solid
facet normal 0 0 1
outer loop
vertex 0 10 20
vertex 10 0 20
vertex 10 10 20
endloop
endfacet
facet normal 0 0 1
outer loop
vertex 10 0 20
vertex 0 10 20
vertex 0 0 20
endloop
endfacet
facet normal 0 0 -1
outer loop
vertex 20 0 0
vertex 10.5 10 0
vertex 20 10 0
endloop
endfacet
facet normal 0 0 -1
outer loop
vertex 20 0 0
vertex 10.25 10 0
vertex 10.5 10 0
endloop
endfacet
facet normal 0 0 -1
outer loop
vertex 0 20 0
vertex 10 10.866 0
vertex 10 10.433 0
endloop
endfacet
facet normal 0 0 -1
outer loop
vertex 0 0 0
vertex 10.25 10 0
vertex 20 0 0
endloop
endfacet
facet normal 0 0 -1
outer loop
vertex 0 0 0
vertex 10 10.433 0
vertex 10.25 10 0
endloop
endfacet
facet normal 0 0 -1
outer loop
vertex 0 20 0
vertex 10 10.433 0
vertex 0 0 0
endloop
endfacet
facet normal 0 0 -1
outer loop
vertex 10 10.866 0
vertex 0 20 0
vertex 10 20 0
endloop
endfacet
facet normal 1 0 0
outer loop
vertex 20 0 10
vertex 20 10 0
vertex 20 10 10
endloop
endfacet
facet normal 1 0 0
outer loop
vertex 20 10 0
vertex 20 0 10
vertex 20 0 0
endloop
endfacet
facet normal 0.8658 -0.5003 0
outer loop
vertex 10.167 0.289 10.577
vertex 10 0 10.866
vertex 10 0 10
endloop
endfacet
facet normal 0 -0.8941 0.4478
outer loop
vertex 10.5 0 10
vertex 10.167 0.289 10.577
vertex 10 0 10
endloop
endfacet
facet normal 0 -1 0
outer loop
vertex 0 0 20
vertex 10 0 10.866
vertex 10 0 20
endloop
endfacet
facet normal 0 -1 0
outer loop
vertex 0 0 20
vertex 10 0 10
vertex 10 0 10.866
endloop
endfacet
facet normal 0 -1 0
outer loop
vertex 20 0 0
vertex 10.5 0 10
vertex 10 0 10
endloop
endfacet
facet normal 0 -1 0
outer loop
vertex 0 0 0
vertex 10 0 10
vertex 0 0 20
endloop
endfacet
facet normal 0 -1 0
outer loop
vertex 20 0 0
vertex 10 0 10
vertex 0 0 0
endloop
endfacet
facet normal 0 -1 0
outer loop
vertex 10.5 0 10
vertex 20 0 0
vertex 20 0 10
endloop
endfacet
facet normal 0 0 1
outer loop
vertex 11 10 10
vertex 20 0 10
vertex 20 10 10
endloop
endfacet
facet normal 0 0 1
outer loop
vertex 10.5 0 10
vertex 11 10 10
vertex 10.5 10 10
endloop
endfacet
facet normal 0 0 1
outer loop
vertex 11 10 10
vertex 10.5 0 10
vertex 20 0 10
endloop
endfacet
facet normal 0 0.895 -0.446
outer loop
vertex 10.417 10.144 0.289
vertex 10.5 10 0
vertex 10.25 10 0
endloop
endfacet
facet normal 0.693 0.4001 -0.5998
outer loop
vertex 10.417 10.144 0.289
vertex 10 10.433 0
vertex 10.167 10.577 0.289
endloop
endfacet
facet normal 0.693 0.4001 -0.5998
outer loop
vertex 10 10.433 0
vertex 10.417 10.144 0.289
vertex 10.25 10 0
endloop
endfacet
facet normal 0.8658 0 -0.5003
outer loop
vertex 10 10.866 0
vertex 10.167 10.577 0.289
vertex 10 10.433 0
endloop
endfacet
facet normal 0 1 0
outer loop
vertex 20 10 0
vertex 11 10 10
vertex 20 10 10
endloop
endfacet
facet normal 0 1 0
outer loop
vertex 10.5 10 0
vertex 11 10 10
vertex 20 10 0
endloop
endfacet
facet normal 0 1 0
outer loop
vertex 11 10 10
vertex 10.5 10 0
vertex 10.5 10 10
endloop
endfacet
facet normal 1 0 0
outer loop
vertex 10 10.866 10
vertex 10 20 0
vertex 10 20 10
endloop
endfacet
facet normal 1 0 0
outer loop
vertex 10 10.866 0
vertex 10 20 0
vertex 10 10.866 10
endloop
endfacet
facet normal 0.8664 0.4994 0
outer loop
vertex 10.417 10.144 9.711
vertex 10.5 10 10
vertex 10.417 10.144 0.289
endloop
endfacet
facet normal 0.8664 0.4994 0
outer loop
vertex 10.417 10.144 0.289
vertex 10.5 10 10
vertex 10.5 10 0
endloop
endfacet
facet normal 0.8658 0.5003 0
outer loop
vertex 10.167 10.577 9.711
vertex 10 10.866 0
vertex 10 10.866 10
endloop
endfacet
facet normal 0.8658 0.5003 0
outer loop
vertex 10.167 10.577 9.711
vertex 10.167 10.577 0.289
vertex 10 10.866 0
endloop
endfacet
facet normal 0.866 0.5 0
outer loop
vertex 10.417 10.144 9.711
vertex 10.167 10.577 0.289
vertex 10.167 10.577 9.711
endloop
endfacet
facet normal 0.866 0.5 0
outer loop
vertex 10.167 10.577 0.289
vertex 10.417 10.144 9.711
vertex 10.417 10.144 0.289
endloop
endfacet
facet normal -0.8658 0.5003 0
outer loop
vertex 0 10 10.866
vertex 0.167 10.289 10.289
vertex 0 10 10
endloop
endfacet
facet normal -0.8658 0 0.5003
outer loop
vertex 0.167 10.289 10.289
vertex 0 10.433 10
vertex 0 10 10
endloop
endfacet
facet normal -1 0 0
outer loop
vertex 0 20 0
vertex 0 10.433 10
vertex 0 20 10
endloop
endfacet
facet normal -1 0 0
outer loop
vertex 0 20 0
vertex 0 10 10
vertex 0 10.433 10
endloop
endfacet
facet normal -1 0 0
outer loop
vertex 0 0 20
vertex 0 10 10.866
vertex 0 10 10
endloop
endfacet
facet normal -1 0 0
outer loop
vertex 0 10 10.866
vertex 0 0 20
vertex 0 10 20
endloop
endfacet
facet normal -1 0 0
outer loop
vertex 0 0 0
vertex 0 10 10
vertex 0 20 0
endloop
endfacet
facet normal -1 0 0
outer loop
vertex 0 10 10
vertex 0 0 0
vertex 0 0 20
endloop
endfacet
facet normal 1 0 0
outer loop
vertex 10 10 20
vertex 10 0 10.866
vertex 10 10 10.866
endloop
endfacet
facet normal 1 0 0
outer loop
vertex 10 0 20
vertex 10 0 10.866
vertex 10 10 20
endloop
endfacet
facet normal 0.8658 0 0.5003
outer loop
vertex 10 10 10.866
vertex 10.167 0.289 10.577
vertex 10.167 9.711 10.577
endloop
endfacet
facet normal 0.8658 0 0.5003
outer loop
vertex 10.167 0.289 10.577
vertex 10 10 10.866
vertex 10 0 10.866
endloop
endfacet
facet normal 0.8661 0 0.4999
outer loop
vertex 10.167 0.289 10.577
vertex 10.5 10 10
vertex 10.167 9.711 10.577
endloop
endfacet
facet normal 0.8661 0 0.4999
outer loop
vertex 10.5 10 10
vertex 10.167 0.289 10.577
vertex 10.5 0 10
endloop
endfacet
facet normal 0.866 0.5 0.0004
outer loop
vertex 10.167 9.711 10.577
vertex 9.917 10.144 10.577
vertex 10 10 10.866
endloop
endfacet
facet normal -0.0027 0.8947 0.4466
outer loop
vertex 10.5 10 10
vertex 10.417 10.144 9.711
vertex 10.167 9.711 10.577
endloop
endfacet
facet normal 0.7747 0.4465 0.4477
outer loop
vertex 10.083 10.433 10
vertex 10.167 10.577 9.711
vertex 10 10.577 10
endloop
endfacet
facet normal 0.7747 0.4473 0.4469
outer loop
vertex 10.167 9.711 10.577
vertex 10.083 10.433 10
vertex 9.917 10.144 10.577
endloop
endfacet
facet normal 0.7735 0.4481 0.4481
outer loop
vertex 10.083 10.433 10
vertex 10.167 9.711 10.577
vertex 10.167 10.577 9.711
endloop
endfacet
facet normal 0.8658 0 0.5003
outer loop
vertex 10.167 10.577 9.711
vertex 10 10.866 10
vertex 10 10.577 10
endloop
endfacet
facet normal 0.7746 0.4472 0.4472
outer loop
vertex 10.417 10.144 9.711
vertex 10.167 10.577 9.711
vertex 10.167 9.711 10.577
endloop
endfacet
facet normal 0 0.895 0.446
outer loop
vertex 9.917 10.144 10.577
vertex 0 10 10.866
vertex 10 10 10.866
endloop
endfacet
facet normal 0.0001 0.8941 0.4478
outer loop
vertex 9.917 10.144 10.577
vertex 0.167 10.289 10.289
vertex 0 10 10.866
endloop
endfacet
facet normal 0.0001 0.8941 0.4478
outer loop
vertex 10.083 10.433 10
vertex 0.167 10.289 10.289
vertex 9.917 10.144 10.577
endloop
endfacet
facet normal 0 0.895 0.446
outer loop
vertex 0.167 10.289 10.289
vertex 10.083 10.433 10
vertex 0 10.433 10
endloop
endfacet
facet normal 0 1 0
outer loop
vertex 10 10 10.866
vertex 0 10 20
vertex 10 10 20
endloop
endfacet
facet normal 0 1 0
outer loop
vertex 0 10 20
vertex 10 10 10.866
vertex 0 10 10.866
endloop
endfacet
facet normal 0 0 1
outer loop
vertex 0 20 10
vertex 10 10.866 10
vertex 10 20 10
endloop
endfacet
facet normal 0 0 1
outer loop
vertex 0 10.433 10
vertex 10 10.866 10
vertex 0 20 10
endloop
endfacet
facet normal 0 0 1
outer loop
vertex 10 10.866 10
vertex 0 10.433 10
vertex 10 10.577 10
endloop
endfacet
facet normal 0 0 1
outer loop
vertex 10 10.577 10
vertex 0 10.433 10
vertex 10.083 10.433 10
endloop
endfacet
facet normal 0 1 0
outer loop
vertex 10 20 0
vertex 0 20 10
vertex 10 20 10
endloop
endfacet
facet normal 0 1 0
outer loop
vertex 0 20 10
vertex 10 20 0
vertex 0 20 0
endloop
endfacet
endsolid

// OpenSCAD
// by: Scorch
// http://www.scorchworks.com/Blog/openscad-modules-for-automatic-fillets-and-radii/
// www.scorchworks.com
// 12/29/2015

// PARAMETERS

sample_R    = 1;      // Radius of the fillet/round to be added

sample_OB   = 1000;   // Outer boundary (should be larger than model outer boundary)

sample_axis = "xyz";  // ["xyz":"xyz",x:x,y:y,z:z]
                      // axes to round choose one (x,y,z, or xyz)

sample_fn   = 6;      // number of facets on radius (per 360 degrees)

MAKE_EXAMPLE = 1;    // [0:Generate sample base part,1: Add fillets to base part,2: Add rounds to base part,3: Add fillets and rounds to base part,4: Add local fillets to base part,5: Add local rounds to base part,6: Add local fillets and local rounds to base part, 7: Show transparent local area selection box on base part]

//-1: Do not make example part
// 0: Generate sample base part
// 1: Add fillets to base part 
// 2: Add rounds to base part 
// 3: Add fillets and rounds to base part 
// 4: Add local fillets to base part 
// 5: Add local rounds to base part 
// 6: Add local fillets and local rounds to base part 
// 7: Show transparent local area selection box on base part 
//

//////////////////////////////////////////////////////////////////////////
//////////////////////////////////////////////////////////////////////////

// The add_fillets module will either auto fillet the whole model or
// a section of the model depending on if ther are one or two children.
// 1 child:       Fillet the whole model
// Two children:  Fillet the first child in the area that is
//                 intersected by the second child 
module add_fillets(R=1,OB=1000,axis="xyz",fn=10)
{
    fn_even = ceil(fn/2)*2;
    if ($children==1)
    {
        minkowski_fillets(R=R,OB=OB,axis=axis,fn=fn_even)
        {
            children(0);
        }
    }
    if ($children==2)
    {
        union()
        {
            minkowski_fillets(R=R,OB=OB,axis=axis,fn=fn_even)
            {
                intersection()
                {
                    children(0);
                    children(1);
                }
            }
            difference()
            {
                children(0);
                children(1);
            }
        }
    }
}


// The add_rounds module will either auto round the whole model or
// a section of the model depending on if ther are one or two children.
// 1 child:       Round the whole model
// Two children:  Round the first child in the area that is
//                  intersected by the second child 
module add_rounds(R=1,OB=1000,axis="xyz",fn=10)
{
    fn_even = ceil(fn/2)*2;
    if ($children==1)
    {
        minkowski_rounds(R=R,OB=OB,axis=axis,fn=fn_even)
        {
            children(0);
        }
    }
    if ($children==2)
    {
        union()
        {
            minkowski_rounds(R=R,OB=OB,axis=axis,fn=fn_even)
            {
                intersection()
                {
                    children(0);
                    minkowski()
                    {
                        children(1);
                        if (axis=="x")   rotate([0 ,90,0]) cylinder(r=R,$fn=fn_even,center=true);
                        if (axis=="y")   rotate([90,0 ,0]) cylinder(r=R,$fn=fn_even,center=true);
                        if (axis=="z")   rotate([0 ,0 ,0]) cylinder(r=R,$fn=fn_even,center=true);
                        if (axis=="xyz") sphere(r=R,$fn=fn_even);
                    }
                }
            }
            difference()
            {
                children(0);
                children(1);
            }
        }
    }
}




module minkowski_fillets(R=1,OB=1000,axis="xyz",fn=10)
{
    OBplus=OB+4*R;
    fn_even = ceil(fn/2)*2;
    echo(fn_even);
    difference()
    {
        cube([OB,OB,OB],center=true);
        minkowski()
        {   
            difference()
            {
                cube([OBplus,OBplus,OBplus],center=true);
                minkowski()
                {
                    children(0);
                    if (axis=="x")   rotate([0 ,90,0]) cylinder(r=R,$fn=fn_even,center=true);
                    if (axis=="y")   rotate([90,0 ,0]) cylinder(r=R,$fn=fn_even,center=true);
                    if (axis=="z")   rotate([0 ,0 ,0]) cylinder(r=R,$fn=fn_even,center=true);
                    if (axis=="xyz") sphere(r=R,$fn=fn);
                }
            }
            if (axis=="x")   rotate([0 ,90,0]) cylinder(r=R,$fn=fn_even,center=true);
            if (axis=="y")   rotate([90,0 ,0]) cylinder(r=R,$fn=fn_even,center=true);
            if (axis=="z")   rotate([0 ,0 ,0]) cylinder(r=R,$fn=fn_even,center=true);
            if (axis=="xyz") sphere(r=R,$fn=fn_even);
        }
    }
}


module minkowski_rounds(R=1,OB=1000,axis="xyz",fn=10)
{
    OBplus=OB+4*R;
    fn_even = ceil(fn/2)*2;
    minkowski()
    {  
        difference()
        {
            cube([OB,OB,OB],center=true);
            minkowski()
            {
                difference()
                {
                    cube([OBplus,OBplus,OBplus],center=true);
                    children(0);
                }
                if (axis=="x")   rotate([0 ,90,0]) cylinder(r=R,$fn=fn_even,center=true);
                if (axis=="y")   rotate([90,0 ,0]) cylinder(r=R,$fn=fn_even,center=true);
                if (axis=="z")   rotate([0 ,0 ,0]) cylinder(r=R,$fn=fn_even,center=true);
                if (axis=="xyz") sphere(r=R,$fn=fn_even);
            }
        }
        if (axis=="x")   rotate([0 ,90,0]) cylinder(r=R,$fn=fn,center=true);
        if (axis=="y")   rotate([90,0 ,0]) cylinder(r=R,$fn=fn,center=true);
        if (axis=="z")   rotate([0 ,0 ,0]) cylinder(r=R,$fn=fn,center=true);
        if (axis=="xyz") sphere(r=R,$fn=fn_even);      
    }
}

//////////////////////////////////////////////////////////
//The remainder of this file contains the Sample models //
//////////////////////////////////////////////////////////
// ------------------------------   
// Base sample object
// ------------------------------
if (MAKE_EXAMPLE==0)
    fillets_and_rounds_sample_object();

// ------------------------------   
// Sample add fillets
// ------------------------------
if (MAKE_EXAMPLE==1)
    render()
        add_fillets(R=sample_R,OB=sample_OB,axis=sample_axis,fn=sample_fn)
            fillets_and_rounds_sample_object();

// ------------------------------   
// Sample add rounds
// ------------------------------
if (MAKE_EXAMPLE==2)
    render()
        add_rounds(R=sample_R,OB=sample_OB,axis=sample_axis,fn=sample_fn)
            fillets_and_rounds_sample_object();
   
// ------------------------------   
// Sample add rounds and fillets
// ------------------------------
if (MAKE_EXAMPLE==3)
{
    render()
        add_fillets(R=sample_R,OB=sample_OB,axis=sample_axis,fn=sample_fn)
            add_rounds(R=sample_R,OB=sample_OB,axis=sample_axis,fn=sample_fn)
                fillets_and_rounds_sample_object();
}       

// ------------------------------   
// Sample add local fillets
// ------------------------------
if (MAKE_EXAMPLE==4)
{
    render()
        add_fillets(R=sample_R,OB=sample_OB,axis=sample_axis,fn=sample_fn)
        {
            fillets_and_rounds_sample_object();
            translate([10,10,0])cube([10,10,50],center=true);
        }
}

// ------------------------------   
// Sample add local rounds
// ------------------------------
if (MAKE_EXAMPLE==5)
{
    render()
        add_rounds(R=sample_R,OB=sample_OB,axis=sample_axis,fn=sample_fn)
        {
            fillets_and_rounds_sample_object();
            translate([10,10,0])cube([10,10,50],center=true);
        }
}

// ------------------------------   
// Sample add rounds and fillets
// ------------------------------
if (MAKE_EXAMPLE==6)
{
    render()
        add_fillets(R=sample_R,OB=sample_OB,axis=sample_axis,fn=sample_fn)
        {
            add_rounds(R=sample_R,OB=sample_OB,axis=sample_axis,fn=sample_fn)
            {
                fillets_and_rounds_sample_object();
                translate([10,10,0])cube([10,10,50],center=true);
            }
            translate([10,10,0])cube([10,10,50],center=true);
        }
}


// ------------------------------   
// Sample Show Intersecting Box
// ------------------------------
if (MAKE_EXAMPLE==7)
{
    fillets_and_rounds_sample_object();
    %translate([10,10,0])cube([10,10,50],center=true);

}

// -------------------
// Sample Object module
// -------------------
module fillets_and_rounds_sample_object()
{
    cube([10,20,10]);
    cube([20,10,10]);
    cube([10,10,20]);
}

// END
